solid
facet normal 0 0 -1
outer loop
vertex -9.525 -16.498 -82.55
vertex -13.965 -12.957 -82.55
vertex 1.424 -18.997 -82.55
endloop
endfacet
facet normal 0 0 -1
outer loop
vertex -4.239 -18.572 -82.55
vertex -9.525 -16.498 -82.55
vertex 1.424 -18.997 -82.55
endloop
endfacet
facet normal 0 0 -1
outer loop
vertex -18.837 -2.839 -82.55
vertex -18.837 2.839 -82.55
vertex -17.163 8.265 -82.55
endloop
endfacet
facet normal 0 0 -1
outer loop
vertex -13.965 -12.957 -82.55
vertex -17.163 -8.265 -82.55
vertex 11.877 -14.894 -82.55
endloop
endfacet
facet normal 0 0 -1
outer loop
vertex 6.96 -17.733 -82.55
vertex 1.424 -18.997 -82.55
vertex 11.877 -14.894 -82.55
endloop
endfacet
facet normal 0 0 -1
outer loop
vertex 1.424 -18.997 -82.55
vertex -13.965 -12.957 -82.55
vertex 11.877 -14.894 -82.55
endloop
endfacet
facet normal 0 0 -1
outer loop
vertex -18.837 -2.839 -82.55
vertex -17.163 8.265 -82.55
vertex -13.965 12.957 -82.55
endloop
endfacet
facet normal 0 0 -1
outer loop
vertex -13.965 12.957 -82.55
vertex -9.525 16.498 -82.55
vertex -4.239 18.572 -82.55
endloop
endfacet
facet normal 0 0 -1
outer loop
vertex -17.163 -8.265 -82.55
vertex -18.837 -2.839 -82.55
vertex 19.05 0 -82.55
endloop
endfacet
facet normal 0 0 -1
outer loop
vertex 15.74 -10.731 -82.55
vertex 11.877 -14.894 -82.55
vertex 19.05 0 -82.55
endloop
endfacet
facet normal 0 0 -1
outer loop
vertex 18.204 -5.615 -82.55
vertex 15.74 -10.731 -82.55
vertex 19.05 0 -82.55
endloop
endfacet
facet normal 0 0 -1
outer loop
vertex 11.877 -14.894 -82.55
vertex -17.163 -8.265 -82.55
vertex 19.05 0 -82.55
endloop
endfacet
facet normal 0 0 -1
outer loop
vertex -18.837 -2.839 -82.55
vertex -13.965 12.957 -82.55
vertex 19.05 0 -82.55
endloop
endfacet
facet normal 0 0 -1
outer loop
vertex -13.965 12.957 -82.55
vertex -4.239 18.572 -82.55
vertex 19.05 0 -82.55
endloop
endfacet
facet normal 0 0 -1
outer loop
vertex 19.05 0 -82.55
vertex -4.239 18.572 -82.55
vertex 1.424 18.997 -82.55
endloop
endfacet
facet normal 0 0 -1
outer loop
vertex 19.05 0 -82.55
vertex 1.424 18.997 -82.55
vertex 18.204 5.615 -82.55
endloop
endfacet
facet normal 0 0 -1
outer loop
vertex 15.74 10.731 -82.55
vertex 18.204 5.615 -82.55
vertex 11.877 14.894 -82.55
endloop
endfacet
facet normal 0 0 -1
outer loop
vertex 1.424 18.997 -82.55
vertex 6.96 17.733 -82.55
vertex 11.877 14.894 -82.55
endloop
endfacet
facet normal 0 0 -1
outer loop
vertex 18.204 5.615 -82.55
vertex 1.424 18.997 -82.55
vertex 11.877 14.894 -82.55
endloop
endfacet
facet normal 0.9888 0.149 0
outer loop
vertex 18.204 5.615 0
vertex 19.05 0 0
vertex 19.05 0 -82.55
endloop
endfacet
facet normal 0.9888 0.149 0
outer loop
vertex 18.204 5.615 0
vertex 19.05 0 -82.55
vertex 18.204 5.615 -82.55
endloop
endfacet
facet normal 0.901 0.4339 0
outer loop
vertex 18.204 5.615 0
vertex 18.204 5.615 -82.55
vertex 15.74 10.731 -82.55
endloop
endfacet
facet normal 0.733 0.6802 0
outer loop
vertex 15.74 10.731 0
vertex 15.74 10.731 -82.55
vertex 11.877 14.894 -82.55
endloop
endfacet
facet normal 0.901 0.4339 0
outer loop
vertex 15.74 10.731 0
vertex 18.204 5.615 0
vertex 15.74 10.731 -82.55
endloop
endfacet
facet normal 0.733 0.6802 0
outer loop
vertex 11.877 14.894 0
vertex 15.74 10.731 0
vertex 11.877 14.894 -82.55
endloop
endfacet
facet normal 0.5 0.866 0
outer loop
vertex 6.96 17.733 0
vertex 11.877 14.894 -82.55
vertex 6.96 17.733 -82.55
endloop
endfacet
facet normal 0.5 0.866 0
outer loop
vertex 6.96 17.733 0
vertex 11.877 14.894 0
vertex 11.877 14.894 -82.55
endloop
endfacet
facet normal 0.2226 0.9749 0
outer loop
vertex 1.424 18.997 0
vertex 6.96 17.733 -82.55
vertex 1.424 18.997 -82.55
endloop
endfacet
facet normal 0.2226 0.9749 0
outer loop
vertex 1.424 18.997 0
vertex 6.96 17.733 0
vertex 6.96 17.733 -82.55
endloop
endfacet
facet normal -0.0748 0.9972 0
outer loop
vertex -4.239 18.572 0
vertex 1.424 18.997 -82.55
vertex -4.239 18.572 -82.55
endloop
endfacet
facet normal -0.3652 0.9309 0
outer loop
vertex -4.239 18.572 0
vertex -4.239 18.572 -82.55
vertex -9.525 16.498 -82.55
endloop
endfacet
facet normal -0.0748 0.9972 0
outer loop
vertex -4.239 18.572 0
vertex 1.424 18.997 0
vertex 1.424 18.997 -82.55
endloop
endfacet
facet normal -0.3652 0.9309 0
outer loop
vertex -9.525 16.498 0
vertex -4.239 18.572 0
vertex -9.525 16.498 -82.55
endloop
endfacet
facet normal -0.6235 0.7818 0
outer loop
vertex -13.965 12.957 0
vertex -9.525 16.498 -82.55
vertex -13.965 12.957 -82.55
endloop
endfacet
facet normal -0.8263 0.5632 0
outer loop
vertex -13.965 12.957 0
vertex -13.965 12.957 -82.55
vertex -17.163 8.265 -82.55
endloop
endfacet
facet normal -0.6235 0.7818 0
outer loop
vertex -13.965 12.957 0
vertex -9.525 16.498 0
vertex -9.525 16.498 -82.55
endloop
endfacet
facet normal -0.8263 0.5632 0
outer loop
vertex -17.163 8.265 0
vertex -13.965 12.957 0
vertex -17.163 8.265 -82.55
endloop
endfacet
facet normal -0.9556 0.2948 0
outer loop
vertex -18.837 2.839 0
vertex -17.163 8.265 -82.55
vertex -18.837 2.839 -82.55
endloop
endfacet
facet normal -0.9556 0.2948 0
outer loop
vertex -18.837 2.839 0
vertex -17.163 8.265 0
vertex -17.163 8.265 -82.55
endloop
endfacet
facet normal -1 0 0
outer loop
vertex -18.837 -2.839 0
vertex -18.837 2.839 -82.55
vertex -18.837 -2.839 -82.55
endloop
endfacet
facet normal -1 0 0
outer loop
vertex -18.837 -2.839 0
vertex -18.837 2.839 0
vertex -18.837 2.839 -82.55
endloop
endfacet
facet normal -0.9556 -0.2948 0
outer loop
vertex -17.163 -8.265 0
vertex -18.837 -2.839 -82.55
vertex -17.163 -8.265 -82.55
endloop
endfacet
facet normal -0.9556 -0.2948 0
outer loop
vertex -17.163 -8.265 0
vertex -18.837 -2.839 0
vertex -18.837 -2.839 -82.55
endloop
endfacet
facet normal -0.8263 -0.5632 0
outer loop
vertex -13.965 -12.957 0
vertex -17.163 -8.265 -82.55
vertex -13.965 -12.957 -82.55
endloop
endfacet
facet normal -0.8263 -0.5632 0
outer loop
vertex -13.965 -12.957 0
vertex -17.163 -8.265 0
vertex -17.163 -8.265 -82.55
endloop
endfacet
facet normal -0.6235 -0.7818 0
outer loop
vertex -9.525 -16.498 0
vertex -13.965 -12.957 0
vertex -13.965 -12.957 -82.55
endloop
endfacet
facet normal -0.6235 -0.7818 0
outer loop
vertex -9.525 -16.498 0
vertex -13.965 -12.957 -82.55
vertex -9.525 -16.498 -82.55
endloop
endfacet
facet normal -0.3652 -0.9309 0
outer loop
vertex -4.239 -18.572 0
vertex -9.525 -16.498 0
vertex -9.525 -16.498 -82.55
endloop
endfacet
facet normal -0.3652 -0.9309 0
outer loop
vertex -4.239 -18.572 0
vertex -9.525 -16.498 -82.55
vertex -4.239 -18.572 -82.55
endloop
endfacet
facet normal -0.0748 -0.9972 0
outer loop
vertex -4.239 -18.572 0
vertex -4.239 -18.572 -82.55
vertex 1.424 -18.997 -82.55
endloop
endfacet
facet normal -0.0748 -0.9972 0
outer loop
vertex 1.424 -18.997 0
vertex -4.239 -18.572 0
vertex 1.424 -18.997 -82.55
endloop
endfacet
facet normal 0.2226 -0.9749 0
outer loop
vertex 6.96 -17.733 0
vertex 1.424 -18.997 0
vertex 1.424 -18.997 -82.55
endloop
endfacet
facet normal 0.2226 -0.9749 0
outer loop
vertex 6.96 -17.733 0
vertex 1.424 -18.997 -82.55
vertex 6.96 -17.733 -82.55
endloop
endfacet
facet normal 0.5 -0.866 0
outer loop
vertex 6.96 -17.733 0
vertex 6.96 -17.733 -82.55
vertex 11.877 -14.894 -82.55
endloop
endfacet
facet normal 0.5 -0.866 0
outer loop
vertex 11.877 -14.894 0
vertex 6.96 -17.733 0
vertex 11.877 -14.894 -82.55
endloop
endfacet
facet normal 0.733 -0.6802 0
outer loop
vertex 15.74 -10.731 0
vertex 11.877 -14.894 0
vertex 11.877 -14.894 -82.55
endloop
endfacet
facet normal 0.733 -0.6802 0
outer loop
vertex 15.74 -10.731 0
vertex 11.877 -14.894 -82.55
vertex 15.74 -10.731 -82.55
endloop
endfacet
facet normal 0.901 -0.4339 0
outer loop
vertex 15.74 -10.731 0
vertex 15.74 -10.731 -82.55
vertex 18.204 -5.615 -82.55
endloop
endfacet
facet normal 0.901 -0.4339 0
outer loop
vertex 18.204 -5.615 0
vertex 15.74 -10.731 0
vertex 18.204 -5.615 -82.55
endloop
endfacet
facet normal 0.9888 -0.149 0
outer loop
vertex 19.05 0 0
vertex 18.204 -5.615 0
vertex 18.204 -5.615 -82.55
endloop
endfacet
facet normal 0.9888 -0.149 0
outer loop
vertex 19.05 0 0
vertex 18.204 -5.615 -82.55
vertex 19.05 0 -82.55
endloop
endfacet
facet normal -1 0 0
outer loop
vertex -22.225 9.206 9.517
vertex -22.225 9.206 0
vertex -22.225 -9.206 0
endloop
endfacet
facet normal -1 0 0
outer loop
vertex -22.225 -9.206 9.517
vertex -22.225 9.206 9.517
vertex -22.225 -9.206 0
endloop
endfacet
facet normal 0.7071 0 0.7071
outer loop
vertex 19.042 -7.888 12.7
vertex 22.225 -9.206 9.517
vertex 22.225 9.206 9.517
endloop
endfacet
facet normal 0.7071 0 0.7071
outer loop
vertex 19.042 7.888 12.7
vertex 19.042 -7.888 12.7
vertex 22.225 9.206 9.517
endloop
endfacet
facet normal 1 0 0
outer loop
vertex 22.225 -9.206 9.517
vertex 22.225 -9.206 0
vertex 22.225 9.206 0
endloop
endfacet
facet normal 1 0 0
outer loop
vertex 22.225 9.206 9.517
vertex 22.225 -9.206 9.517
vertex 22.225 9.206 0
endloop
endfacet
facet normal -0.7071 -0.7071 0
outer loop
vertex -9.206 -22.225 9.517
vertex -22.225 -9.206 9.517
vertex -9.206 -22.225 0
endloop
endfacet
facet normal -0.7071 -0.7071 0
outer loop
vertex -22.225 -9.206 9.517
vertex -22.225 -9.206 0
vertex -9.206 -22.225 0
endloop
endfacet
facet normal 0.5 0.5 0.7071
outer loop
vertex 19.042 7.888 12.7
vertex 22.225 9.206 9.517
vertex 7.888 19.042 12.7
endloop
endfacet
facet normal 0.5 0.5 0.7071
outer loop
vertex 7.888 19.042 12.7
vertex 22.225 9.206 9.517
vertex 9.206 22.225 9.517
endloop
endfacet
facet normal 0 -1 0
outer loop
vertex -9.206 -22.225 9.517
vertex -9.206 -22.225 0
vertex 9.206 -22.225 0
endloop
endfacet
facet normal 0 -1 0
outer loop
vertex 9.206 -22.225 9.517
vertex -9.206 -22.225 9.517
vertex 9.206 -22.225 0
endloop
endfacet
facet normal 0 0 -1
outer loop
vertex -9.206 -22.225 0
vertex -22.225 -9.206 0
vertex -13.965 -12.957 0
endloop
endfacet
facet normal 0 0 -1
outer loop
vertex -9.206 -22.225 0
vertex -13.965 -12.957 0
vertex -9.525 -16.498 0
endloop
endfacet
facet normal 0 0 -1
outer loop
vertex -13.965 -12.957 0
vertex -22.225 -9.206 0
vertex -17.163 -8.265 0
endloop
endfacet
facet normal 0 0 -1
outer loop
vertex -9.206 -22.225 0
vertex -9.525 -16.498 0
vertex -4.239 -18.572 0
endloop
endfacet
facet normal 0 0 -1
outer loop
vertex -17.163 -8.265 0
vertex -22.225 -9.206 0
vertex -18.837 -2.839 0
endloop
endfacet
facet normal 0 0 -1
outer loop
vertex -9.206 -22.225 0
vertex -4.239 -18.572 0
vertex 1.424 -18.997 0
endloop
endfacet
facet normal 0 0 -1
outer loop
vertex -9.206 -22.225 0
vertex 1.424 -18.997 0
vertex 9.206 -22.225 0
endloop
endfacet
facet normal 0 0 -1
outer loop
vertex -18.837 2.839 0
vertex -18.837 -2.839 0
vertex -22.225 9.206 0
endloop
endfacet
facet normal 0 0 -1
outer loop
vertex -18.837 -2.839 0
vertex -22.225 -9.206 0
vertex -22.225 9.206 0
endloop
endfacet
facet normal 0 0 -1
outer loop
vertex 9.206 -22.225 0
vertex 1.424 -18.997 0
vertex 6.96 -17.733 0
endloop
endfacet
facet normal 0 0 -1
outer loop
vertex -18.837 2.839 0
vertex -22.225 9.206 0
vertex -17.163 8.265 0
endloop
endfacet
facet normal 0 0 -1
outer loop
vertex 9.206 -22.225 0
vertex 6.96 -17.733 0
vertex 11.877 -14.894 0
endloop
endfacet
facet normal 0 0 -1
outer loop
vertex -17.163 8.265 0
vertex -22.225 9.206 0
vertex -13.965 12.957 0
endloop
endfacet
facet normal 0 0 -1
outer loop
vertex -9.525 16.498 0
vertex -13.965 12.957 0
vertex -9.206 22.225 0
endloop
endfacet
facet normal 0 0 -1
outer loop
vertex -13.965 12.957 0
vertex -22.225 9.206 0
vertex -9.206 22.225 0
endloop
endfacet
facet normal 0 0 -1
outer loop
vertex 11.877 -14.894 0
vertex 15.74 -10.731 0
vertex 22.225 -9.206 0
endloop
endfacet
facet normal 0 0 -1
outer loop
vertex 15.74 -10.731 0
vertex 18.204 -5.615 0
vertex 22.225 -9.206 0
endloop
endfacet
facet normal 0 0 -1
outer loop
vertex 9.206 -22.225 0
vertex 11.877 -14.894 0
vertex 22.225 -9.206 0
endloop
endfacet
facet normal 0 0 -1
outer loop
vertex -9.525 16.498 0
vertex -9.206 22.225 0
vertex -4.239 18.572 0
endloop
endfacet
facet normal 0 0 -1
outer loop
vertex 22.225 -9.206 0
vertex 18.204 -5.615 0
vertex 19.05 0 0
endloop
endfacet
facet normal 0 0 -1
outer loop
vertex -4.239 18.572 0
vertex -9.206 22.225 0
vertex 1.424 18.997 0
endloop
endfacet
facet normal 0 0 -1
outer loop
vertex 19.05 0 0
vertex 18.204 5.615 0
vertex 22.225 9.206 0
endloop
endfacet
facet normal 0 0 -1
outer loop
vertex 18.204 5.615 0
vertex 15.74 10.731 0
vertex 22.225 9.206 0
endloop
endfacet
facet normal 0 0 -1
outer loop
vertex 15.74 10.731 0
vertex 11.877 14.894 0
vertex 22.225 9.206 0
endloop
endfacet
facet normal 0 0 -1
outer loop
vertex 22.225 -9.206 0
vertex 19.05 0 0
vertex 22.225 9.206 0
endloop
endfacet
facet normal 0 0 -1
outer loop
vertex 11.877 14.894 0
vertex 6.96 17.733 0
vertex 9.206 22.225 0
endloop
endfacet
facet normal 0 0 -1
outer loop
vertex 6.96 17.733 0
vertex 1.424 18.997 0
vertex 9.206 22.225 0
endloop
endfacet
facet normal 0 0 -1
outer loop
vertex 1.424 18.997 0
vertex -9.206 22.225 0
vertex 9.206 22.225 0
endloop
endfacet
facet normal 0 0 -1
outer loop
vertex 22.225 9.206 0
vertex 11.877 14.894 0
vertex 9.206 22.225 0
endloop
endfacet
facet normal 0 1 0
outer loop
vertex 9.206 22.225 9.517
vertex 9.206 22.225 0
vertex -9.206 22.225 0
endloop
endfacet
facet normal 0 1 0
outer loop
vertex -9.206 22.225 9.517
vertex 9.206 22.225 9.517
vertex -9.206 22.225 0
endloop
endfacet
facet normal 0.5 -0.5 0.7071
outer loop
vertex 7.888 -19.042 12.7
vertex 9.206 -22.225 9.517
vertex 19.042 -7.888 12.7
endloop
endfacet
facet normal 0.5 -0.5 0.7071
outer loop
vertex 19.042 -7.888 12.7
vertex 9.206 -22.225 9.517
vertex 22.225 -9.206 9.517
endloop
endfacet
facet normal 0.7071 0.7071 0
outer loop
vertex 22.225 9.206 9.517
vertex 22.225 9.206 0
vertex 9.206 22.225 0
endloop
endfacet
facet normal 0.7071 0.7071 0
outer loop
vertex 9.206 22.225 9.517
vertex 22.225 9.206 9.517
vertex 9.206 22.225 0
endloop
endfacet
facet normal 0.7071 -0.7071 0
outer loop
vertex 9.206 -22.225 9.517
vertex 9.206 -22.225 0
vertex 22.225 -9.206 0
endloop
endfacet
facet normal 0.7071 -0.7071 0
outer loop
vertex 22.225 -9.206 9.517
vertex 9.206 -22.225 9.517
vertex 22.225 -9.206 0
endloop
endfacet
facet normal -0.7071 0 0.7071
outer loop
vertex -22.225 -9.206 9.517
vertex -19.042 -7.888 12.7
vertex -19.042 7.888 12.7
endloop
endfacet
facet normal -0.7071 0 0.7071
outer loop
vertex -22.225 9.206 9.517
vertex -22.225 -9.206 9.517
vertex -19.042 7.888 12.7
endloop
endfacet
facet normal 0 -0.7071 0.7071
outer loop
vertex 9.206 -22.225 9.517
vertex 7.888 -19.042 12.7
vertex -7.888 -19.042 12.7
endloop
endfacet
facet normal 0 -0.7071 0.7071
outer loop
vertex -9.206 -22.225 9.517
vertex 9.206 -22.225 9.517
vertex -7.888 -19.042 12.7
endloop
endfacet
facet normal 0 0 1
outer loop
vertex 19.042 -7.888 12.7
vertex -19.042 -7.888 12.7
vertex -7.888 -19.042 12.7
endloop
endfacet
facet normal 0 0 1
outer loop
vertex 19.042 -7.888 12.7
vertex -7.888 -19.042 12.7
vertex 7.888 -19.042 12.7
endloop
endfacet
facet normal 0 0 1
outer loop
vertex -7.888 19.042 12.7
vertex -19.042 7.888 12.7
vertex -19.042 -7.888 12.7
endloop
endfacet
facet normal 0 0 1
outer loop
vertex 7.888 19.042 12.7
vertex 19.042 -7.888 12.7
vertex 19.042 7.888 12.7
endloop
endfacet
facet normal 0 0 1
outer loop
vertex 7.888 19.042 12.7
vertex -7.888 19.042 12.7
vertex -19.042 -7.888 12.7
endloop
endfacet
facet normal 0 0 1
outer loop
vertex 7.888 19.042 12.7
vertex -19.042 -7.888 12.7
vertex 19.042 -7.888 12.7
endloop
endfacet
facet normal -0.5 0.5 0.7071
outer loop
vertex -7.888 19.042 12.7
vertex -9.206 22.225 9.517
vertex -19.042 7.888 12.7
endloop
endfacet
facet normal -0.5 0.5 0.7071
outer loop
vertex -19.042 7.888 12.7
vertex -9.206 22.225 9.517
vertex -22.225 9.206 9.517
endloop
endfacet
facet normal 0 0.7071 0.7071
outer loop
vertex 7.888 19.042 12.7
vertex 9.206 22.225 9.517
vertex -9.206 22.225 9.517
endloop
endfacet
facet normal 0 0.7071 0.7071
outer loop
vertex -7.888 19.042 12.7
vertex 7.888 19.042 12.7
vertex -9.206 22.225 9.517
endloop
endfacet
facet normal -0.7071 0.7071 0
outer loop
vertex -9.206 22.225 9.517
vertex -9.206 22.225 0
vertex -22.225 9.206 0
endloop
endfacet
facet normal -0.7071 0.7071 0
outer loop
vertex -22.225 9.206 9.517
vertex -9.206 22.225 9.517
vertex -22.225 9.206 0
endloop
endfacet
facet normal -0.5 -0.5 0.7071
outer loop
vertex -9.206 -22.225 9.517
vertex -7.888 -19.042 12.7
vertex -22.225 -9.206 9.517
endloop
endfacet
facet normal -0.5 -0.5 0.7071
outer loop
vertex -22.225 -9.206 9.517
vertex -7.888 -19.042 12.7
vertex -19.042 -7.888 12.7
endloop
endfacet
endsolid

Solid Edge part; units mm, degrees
sketch "Sketch1" plane through (0, 0, 0) normal (0, 0, 1) x (1, 0, 0)
  circle A0 centre (0, 0) radius 19.05
extrude "Protrusion1" add sketch "Sketch1" against normal blind 82.55
sketch "Sketch2" plane through (0, 0, 0) normal (0, 0, 1) x (1, 0, 0)
  line L0 (-22.225, -9.2059) -> (-9.2059, -22.225)
  line L1 (-9.2059, -22.225) -> (9.2059, -22.225)
  line L2 (9.2059, -22.225) -> (22.225, -9.2059)
  line L3 (22.225, -9.2059) -> (22.225, 9.2059)
  line L4 (22.225, 9.2059) -> (9.2059, 22.225)
  line L5 (9.2059, 22.225) -> (-9.2059, 22.225)
  line L6 (-9.2059, 22.225) -> (-22.225, 9.2059)
  line L7 (-22.225, 9.2059) -> (-22.225, -9.2059)
extrude "ExtrudedProtrusion_2" add sketch "Sketch2" along normal blind 12.7
chamfer "Chamfer_1" distance 3.1826 angle 45 8 edges at (15.7154, -15.7154, 12.7) (22.225, 0, 12.7) (15.7154, 15.7154, 12.7) (0, 22.225, 12.7) (-15.7154, 15.7154, 12.7) (-22.225, 0, 12.7) (-15.7154, -15.7154, 12.7) (0, -22.225, 12.7)
